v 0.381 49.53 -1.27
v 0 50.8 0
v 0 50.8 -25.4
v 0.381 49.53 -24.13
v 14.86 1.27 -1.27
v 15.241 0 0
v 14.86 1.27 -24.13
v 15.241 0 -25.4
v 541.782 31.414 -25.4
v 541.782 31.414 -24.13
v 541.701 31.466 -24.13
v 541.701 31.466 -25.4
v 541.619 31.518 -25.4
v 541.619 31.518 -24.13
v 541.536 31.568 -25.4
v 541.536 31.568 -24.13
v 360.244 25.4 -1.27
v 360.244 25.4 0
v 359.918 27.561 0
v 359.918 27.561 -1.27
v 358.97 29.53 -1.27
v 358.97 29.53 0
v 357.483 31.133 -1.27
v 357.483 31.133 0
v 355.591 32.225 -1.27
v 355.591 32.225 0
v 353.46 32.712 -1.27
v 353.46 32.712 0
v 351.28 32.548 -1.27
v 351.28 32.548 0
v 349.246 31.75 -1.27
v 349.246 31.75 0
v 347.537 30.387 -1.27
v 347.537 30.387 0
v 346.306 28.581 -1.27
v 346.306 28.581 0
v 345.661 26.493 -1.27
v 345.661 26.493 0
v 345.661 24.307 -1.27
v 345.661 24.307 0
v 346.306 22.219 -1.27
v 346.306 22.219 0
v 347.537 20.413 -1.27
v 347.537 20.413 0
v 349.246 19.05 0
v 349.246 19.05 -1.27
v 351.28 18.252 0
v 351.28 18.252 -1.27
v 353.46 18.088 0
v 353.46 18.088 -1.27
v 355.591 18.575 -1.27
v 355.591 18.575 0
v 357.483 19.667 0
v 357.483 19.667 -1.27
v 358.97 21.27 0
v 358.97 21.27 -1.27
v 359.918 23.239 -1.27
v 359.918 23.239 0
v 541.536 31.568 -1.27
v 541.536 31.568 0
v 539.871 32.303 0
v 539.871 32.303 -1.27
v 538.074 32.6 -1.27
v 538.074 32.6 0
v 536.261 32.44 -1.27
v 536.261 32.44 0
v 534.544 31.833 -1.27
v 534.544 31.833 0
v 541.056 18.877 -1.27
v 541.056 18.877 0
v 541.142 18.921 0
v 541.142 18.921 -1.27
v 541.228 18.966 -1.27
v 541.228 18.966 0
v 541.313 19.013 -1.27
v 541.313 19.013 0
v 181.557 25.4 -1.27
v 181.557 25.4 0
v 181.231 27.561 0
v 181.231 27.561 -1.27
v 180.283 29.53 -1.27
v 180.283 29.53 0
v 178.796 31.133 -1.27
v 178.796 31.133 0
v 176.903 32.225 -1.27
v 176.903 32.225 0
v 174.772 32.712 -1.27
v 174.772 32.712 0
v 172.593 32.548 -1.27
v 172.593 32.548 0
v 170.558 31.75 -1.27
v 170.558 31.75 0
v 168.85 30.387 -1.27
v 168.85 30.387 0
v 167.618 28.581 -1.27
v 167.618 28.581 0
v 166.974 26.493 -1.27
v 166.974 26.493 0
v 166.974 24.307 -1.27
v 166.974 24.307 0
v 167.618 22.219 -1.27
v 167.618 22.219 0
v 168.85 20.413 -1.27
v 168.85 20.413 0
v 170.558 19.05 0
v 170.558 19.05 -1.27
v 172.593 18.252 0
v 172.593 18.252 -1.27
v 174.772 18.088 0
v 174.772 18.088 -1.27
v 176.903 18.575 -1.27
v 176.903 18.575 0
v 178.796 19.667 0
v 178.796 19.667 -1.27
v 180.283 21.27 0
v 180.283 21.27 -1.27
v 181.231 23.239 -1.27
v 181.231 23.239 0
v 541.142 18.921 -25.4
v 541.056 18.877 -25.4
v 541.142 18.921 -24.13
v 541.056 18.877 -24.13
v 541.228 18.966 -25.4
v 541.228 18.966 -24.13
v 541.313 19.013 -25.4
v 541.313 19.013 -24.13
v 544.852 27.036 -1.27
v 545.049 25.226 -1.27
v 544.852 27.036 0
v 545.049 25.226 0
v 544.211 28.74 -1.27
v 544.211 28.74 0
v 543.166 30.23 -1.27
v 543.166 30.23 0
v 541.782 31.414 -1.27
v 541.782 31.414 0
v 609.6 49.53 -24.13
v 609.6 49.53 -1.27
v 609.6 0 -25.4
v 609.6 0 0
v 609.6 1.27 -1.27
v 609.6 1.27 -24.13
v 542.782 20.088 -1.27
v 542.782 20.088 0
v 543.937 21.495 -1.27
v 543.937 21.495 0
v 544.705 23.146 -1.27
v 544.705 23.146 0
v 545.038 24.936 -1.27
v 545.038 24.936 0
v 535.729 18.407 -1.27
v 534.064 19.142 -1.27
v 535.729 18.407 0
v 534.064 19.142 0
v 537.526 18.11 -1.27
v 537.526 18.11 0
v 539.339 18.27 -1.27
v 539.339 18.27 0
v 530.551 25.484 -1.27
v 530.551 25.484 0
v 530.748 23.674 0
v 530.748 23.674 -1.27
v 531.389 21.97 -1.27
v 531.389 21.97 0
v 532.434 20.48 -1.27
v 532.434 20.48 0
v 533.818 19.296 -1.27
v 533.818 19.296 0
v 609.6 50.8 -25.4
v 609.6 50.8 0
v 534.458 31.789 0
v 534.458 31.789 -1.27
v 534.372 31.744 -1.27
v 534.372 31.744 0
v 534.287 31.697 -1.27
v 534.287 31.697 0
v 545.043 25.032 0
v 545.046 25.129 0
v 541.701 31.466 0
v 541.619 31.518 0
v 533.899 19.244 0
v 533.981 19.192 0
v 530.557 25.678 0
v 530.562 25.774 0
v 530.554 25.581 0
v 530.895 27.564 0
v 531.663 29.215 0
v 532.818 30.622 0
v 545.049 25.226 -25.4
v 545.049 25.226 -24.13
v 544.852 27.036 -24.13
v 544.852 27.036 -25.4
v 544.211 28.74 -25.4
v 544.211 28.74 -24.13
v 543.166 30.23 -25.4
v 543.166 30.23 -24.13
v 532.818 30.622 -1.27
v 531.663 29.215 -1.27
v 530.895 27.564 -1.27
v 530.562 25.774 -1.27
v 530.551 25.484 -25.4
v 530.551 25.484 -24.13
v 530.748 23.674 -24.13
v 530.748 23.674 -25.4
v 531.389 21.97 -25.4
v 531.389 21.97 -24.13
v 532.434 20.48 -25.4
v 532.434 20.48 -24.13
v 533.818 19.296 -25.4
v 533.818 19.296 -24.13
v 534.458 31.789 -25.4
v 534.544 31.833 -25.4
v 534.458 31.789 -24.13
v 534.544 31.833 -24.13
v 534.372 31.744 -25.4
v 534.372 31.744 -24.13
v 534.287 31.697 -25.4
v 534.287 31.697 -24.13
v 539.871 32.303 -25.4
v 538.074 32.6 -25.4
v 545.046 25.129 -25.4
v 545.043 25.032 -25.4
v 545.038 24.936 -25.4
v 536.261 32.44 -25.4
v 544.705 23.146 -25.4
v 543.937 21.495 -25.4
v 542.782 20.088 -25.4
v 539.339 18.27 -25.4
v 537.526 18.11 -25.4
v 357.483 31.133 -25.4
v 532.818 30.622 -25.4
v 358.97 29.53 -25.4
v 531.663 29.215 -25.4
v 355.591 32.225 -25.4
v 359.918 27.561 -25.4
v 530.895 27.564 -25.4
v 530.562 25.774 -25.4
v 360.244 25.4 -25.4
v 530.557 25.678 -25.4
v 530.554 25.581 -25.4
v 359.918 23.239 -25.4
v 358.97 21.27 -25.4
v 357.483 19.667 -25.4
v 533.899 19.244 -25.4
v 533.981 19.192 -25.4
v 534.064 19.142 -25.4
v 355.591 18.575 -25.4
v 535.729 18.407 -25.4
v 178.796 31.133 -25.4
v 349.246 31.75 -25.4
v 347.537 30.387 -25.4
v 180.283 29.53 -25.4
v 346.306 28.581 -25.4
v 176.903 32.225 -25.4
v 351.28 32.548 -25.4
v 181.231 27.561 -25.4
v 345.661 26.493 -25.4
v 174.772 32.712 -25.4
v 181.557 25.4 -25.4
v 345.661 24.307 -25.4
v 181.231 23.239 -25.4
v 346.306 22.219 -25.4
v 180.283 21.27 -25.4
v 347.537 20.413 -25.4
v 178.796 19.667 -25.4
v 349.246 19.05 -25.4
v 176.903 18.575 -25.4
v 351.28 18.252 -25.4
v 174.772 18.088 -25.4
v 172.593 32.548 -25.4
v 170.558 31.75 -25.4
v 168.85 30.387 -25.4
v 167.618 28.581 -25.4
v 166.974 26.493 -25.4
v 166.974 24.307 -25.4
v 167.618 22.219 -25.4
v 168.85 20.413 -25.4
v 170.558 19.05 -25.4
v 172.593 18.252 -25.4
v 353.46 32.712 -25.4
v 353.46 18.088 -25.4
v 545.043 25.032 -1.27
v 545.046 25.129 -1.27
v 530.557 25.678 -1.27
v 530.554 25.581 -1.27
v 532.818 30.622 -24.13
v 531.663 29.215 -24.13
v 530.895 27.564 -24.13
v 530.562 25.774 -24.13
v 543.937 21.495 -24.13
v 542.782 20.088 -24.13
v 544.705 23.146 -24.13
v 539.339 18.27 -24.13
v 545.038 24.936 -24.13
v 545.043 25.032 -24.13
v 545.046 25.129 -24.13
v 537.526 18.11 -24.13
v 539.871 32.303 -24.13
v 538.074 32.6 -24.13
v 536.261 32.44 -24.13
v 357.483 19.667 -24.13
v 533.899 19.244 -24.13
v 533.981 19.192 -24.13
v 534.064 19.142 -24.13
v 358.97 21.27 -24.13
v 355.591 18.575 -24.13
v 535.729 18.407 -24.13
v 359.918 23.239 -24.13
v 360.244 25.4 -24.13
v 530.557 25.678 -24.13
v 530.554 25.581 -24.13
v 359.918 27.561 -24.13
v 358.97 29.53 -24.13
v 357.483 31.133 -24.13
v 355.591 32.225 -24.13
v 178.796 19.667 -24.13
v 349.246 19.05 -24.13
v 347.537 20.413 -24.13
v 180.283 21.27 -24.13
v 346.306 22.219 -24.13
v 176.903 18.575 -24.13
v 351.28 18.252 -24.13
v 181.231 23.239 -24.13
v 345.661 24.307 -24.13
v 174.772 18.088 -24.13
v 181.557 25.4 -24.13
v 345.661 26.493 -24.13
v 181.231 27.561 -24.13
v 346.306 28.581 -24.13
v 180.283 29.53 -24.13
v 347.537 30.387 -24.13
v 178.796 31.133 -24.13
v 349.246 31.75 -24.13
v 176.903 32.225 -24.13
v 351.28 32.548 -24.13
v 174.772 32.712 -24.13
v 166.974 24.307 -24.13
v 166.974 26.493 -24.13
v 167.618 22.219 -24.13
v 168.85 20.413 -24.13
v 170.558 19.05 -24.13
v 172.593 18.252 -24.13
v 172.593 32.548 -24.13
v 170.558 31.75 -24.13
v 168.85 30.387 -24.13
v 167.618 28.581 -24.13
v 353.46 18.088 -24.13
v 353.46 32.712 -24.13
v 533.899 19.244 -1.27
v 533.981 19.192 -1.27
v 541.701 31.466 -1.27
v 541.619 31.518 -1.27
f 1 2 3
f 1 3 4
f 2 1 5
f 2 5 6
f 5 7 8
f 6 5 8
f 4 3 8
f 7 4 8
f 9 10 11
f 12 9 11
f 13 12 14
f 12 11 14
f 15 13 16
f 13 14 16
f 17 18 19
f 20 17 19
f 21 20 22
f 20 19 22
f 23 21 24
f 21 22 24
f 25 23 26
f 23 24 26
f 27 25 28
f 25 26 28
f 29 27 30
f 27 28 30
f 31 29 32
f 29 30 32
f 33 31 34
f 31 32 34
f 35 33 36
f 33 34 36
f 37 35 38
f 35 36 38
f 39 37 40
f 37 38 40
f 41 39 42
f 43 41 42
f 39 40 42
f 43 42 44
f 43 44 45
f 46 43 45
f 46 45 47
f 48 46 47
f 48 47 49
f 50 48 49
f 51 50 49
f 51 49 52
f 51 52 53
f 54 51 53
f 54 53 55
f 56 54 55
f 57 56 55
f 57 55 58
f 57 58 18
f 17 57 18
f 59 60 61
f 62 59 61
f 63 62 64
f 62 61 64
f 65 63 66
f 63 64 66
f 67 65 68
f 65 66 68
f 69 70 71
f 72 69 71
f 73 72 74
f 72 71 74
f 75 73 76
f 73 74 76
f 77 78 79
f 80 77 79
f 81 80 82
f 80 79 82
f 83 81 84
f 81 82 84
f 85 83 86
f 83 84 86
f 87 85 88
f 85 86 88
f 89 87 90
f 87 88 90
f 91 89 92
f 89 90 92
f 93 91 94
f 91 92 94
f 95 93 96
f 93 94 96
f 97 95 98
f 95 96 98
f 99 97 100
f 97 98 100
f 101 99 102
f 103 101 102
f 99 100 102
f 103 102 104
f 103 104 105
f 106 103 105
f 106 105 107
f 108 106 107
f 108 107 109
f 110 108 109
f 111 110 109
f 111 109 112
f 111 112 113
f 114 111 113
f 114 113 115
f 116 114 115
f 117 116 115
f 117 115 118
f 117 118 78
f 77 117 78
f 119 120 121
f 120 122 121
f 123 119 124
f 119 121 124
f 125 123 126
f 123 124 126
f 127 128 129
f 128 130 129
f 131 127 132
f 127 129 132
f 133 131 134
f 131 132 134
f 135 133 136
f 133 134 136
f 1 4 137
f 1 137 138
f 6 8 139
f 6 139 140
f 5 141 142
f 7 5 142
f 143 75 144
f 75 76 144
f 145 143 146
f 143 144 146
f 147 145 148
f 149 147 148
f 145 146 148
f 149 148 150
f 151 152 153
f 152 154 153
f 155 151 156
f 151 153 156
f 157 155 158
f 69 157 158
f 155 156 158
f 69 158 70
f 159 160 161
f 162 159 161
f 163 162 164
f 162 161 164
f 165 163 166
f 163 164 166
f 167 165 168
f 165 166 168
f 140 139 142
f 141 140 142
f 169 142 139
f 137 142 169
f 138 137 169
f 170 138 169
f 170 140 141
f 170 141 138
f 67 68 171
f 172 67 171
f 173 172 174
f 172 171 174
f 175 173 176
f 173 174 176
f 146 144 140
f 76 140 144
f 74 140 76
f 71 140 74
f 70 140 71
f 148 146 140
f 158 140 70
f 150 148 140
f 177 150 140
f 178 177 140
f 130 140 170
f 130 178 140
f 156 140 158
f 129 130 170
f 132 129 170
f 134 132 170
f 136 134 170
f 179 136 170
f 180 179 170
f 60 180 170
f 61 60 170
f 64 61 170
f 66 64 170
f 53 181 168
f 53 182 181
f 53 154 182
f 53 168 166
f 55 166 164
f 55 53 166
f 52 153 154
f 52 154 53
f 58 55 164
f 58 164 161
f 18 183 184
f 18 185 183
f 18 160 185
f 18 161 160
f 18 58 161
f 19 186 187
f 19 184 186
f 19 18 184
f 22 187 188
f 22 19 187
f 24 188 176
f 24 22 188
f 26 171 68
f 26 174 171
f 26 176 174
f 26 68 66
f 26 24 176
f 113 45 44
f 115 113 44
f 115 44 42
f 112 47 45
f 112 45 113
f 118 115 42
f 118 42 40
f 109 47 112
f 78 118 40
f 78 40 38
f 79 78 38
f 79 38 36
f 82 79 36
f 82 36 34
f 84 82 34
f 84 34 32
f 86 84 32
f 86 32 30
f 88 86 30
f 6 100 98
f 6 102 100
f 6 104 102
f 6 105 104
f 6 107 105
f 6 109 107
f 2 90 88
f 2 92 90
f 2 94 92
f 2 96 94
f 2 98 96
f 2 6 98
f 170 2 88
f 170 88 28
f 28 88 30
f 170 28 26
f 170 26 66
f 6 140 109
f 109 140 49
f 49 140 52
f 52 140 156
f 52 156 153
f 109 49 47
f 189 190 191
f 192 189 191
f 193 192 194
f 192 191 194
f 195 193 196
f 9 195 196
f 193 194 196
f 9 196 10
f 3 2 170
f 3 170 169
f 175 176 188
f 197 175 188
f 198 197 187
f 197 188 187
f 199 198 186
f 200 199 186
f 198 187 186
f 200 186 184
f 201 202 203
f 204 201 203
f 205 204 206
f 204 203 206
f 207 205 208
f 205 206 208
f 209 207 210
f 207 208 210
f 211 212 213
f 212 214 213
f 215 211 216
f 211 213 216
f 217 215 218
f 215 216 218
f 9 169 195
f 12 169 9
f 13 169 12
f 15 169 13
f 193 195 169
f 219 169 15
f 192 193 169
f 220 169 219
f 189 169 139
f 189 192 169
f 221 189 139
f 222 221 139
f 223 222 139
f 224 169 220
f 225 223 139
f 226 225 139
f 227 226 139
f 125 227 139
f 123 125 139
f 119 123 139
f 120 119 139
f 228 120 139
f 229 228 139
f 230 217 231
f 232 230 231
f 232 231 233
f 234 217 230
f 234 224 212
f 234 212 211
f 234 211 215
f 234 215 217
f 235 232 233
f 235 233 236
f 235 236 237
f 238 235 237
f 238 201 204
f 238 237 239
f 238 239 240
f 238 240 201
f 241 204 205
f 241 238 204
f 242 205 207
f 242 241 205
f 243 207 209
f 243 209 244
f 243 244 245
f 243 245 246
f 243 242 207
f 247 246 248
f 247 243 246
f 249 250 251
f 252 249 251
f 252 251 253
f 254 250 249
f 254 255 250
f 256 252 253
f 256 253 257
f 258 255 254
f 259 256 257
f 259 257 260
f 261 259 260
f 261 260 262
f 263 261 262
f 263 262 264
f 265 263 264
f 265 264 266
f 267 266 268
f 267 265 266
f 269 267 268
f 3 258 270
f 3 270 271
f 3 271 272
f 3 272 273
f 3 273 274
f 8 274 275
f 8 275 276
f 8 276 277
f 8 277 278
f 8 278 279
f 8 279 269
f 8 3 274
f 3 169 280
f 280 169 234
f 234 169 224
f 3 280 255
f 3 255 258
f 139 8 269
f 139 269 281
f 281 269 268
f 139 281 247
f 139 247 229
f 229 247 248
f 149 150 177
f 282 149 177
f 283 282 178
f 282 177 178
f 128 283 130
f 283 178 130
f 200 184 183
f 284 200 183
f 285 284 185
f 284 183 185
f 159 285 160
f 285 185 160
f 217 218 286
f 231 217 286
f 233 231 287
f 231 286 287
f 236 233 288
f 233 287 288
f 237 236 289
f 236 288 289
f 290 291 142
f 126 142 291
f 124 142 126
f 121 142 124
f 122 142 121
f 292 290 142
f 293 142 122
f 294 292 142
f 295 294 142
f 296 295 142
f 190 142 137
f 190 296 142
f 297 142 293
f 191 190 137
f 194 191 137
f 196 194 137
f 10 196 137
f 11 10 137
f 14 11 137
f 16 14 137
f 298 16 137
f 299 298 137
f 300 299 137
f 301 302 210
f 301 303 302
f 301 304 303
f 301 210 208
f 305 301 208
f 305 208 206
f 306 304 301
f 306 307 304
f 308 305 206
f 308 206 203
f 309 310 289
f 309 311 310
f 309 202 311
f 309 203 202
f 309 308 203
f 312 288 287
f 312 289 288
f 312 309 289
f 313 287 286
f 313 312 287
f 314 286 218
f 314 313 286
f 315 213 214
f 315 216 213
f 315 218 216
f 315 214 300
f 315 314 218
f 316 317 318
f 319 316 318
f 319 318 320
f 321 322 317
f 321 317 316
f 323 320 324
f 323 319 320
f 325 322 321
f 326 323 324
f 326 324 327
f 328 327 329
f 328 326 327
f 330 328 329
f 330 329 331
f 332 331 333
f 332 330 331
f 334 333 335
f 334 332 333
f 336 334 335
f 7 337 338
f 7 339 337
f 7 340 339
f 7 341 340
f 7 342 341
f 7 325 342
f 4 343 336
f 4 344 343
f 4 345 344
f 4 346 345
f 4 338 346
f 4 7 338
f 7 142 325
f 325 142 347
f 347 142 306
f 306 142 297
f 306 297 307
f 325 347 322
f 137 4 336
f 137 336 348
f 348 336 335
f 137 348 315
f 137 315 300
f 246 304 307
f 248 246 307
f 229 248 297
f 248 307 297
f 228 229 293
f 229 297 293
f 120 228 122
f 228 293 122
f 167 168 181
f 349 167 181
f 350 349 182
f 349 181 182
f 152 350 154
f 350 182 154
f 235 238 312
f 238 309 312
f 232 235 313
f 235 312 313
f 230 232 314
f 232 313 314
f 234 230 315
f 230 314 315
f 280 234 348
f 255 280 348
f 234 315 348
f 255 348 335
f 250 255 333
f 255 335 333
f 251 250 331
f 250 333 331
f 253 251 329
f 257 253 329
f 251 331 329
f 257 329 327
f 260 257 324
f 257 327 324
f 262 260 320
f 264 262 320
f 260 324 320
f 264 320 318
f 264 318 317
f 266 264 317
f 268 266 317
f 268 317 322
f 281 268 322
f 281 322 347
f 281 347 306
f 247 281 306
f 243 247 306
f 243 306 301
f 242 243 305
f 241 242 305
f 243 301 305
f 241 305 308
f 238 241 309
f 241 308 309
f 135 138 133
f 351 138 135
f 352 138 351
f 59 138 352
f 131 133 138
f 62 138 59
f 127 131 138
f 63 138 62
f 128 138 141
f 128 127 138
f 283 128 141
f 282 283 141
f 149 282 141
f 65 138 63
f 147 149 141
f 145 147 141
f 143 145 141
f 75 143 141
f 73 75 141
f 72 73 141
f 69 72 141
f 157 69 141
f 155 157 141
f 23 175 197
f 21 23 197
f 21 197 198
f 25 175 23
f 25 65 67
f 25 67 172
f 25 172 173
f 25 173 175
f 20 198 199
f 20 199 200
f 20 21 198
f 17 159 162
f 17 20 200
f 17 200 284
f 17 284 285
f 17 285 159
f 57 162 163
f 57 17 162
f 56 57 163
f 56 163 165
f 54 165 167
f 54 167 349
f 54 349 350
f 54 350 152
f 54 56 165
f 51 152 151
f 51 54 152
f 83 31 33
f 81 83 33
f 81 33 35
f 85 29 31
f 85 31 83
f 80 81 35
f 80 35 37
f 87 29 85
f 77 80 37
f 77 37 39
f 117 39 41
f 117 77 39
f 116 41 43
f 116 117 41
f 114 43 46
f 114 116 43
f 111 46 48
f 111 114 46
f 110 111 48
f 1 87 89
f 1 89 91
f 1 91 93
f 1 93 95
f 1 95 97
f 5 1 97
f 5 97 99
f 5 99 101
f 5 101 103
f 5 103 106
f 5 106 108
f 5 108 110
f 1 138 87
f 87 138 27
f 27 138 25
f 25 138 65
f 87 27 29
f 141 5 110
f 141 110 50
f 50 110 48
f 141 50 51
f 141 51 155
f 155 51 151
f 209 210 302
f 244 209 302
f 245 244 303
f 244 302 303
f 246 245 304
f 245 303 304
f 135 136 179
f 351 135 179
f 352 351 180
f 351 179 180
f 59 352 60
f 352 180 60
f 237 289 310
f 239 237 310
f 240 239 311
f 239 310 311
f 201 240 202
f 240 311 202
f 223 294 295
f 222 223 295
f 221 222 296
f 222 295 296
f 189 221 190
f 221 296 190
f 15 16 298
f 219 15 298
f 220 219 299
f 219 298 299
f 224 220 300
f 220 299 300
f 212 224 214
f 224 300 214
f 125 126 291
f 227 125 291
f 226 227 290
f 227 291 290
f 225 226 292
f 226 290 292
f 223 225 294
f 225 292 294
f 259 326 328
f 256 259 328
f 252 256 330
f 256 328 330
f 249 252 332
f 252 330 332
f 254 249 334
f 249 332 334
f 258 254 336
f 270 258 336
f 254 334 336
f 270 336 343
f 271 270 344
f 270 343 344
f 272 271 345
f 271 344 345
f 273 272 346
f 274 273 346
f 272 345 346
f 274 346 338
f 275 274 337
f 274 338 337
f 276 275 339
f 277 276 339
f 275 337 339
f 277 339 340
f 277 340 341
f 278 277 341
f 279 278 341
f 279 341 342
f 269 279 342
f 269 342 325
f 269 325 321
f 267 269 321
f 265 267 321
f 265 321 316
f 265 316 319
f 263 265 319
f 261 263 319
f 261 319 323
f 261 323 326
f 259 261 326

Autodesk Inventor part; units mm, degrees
ref_plane "YZ Plane" through (0, 0, 0) normal (1, 0, 0) x (0, 1, 0)
ref_plane "XZ Plane" through (0, 0, 0) normal (0, 1, 0) x (-1, 0, 0)
ref_plane "XY Plane" through (0, 0, 0) normal (0, 0, 1) x (1, 0, 0)
sketch "Sketch1" plane through (0, 0, 0) normal (1, 0, 0) x (0, 1, 0)
  line L0 (0, 0) -> (50.8, 0)
  line L1 (50.8, 0) -> (50.8, -25.4)
  line L2 (50.8, -25.4) -> (0, -25.4)
  line L3 (0, -25.4) -> (0, 0)
  line L4 (49.53, -24.13) -> (49.53, -1.27)
  line L5 (49.53, -1.27) -> (1.27, -1.27)
  line L6 (1.27, -1.27) -> (1.27, -24.13)
  line L7 (1.27, -24.13) -> (49.53, -24.13)
  dimension "d0" = 50.8
  dimension "d1" = 25.4
  dimension "d2" = 1.27
extrude "Extrusion1" add sketch "Sketch1" along normal blind 609.6
sketch "Sketch2" plane through (0, 0, 0) normal (0, 0, 1) x (1, 0, 0)
  line L0 (537.5598, 19.0095) -> (541.0559, 18.8772) projected
  line L1 (534.0637, 19.1419) -> (537.5598, 19.0095) projected
  line L2 (532.1846, 22.3903) -> (533.818, 19.2964) projected
  arc A0 (533.818, 19.2964) -> (534.0637, 19.1419) centre (537.8, 25.355) ccw projected
  arc A1 (530.5621, 25.7742) -> (530.5512, 25.4841) centre (537.8, 25.355) ccw projected
  arc A2 (534.5441, 31.8328) -> (534.2874, 31.6973) centre (537.8, 25.355) ccw projected
  arc A3 (541.782, 31.4136) -> (541.5363, 31.5681) centre (537.8, 25.355) ccw projected
  arc A4 (545.0379, 24.9358) -> (545.0488, 25.2259) centre (537.8, 25.355) ccw projected
  arc A5 (541.0559, 18.8772) -> (541.3126, 19.0127) centre (537.8, 25.355) ccw projected
  circle A6 centre (537.8, 25.355) radius 7.25
  point P0 (0, 0)
extrude "Extrusion2" cut sketch "Sketch2" against normal through all
sketch "Sketch4" plane through (0, 0, 0) normal (0, 0, 1) x (1, 0, 0)
  circle A0 centre (352.9118, 25.4) radius 7.3323
  circle A1 centre (174.2245, 25.4) radius 7.3323
  point P0 (0, 0)
extrude "Extrusion4" cut sketch "Sketch4" against normal through all
sketch "Sketch5" plane through (0, 0, -25.4) normal (0, 0, -1) x (-1, 0, 0)
  line L0 (0, 50.8) -> (-609.6, 50.8) projected
  line L1 (0, 50.8) -> (-15.2407, 0)
  line L2 (0, 0) -> (-609.6, 0) projected
  line L3 (0, 50.8) -> (53.037, 50.8) construction
  line L4 (0, 50.8) -> (0, 0)
  line L5 (0, 0) -> (-15.2407, 0)
  line L6 (0, 1.27) -> (-609.6, 1.27) projected
  dimension "d12" = 106.7
extrude "Extrusion5" cut sketch "Sketch5" against normal blind 25.4
properties part number "Aluminum Channel Arm Left"
